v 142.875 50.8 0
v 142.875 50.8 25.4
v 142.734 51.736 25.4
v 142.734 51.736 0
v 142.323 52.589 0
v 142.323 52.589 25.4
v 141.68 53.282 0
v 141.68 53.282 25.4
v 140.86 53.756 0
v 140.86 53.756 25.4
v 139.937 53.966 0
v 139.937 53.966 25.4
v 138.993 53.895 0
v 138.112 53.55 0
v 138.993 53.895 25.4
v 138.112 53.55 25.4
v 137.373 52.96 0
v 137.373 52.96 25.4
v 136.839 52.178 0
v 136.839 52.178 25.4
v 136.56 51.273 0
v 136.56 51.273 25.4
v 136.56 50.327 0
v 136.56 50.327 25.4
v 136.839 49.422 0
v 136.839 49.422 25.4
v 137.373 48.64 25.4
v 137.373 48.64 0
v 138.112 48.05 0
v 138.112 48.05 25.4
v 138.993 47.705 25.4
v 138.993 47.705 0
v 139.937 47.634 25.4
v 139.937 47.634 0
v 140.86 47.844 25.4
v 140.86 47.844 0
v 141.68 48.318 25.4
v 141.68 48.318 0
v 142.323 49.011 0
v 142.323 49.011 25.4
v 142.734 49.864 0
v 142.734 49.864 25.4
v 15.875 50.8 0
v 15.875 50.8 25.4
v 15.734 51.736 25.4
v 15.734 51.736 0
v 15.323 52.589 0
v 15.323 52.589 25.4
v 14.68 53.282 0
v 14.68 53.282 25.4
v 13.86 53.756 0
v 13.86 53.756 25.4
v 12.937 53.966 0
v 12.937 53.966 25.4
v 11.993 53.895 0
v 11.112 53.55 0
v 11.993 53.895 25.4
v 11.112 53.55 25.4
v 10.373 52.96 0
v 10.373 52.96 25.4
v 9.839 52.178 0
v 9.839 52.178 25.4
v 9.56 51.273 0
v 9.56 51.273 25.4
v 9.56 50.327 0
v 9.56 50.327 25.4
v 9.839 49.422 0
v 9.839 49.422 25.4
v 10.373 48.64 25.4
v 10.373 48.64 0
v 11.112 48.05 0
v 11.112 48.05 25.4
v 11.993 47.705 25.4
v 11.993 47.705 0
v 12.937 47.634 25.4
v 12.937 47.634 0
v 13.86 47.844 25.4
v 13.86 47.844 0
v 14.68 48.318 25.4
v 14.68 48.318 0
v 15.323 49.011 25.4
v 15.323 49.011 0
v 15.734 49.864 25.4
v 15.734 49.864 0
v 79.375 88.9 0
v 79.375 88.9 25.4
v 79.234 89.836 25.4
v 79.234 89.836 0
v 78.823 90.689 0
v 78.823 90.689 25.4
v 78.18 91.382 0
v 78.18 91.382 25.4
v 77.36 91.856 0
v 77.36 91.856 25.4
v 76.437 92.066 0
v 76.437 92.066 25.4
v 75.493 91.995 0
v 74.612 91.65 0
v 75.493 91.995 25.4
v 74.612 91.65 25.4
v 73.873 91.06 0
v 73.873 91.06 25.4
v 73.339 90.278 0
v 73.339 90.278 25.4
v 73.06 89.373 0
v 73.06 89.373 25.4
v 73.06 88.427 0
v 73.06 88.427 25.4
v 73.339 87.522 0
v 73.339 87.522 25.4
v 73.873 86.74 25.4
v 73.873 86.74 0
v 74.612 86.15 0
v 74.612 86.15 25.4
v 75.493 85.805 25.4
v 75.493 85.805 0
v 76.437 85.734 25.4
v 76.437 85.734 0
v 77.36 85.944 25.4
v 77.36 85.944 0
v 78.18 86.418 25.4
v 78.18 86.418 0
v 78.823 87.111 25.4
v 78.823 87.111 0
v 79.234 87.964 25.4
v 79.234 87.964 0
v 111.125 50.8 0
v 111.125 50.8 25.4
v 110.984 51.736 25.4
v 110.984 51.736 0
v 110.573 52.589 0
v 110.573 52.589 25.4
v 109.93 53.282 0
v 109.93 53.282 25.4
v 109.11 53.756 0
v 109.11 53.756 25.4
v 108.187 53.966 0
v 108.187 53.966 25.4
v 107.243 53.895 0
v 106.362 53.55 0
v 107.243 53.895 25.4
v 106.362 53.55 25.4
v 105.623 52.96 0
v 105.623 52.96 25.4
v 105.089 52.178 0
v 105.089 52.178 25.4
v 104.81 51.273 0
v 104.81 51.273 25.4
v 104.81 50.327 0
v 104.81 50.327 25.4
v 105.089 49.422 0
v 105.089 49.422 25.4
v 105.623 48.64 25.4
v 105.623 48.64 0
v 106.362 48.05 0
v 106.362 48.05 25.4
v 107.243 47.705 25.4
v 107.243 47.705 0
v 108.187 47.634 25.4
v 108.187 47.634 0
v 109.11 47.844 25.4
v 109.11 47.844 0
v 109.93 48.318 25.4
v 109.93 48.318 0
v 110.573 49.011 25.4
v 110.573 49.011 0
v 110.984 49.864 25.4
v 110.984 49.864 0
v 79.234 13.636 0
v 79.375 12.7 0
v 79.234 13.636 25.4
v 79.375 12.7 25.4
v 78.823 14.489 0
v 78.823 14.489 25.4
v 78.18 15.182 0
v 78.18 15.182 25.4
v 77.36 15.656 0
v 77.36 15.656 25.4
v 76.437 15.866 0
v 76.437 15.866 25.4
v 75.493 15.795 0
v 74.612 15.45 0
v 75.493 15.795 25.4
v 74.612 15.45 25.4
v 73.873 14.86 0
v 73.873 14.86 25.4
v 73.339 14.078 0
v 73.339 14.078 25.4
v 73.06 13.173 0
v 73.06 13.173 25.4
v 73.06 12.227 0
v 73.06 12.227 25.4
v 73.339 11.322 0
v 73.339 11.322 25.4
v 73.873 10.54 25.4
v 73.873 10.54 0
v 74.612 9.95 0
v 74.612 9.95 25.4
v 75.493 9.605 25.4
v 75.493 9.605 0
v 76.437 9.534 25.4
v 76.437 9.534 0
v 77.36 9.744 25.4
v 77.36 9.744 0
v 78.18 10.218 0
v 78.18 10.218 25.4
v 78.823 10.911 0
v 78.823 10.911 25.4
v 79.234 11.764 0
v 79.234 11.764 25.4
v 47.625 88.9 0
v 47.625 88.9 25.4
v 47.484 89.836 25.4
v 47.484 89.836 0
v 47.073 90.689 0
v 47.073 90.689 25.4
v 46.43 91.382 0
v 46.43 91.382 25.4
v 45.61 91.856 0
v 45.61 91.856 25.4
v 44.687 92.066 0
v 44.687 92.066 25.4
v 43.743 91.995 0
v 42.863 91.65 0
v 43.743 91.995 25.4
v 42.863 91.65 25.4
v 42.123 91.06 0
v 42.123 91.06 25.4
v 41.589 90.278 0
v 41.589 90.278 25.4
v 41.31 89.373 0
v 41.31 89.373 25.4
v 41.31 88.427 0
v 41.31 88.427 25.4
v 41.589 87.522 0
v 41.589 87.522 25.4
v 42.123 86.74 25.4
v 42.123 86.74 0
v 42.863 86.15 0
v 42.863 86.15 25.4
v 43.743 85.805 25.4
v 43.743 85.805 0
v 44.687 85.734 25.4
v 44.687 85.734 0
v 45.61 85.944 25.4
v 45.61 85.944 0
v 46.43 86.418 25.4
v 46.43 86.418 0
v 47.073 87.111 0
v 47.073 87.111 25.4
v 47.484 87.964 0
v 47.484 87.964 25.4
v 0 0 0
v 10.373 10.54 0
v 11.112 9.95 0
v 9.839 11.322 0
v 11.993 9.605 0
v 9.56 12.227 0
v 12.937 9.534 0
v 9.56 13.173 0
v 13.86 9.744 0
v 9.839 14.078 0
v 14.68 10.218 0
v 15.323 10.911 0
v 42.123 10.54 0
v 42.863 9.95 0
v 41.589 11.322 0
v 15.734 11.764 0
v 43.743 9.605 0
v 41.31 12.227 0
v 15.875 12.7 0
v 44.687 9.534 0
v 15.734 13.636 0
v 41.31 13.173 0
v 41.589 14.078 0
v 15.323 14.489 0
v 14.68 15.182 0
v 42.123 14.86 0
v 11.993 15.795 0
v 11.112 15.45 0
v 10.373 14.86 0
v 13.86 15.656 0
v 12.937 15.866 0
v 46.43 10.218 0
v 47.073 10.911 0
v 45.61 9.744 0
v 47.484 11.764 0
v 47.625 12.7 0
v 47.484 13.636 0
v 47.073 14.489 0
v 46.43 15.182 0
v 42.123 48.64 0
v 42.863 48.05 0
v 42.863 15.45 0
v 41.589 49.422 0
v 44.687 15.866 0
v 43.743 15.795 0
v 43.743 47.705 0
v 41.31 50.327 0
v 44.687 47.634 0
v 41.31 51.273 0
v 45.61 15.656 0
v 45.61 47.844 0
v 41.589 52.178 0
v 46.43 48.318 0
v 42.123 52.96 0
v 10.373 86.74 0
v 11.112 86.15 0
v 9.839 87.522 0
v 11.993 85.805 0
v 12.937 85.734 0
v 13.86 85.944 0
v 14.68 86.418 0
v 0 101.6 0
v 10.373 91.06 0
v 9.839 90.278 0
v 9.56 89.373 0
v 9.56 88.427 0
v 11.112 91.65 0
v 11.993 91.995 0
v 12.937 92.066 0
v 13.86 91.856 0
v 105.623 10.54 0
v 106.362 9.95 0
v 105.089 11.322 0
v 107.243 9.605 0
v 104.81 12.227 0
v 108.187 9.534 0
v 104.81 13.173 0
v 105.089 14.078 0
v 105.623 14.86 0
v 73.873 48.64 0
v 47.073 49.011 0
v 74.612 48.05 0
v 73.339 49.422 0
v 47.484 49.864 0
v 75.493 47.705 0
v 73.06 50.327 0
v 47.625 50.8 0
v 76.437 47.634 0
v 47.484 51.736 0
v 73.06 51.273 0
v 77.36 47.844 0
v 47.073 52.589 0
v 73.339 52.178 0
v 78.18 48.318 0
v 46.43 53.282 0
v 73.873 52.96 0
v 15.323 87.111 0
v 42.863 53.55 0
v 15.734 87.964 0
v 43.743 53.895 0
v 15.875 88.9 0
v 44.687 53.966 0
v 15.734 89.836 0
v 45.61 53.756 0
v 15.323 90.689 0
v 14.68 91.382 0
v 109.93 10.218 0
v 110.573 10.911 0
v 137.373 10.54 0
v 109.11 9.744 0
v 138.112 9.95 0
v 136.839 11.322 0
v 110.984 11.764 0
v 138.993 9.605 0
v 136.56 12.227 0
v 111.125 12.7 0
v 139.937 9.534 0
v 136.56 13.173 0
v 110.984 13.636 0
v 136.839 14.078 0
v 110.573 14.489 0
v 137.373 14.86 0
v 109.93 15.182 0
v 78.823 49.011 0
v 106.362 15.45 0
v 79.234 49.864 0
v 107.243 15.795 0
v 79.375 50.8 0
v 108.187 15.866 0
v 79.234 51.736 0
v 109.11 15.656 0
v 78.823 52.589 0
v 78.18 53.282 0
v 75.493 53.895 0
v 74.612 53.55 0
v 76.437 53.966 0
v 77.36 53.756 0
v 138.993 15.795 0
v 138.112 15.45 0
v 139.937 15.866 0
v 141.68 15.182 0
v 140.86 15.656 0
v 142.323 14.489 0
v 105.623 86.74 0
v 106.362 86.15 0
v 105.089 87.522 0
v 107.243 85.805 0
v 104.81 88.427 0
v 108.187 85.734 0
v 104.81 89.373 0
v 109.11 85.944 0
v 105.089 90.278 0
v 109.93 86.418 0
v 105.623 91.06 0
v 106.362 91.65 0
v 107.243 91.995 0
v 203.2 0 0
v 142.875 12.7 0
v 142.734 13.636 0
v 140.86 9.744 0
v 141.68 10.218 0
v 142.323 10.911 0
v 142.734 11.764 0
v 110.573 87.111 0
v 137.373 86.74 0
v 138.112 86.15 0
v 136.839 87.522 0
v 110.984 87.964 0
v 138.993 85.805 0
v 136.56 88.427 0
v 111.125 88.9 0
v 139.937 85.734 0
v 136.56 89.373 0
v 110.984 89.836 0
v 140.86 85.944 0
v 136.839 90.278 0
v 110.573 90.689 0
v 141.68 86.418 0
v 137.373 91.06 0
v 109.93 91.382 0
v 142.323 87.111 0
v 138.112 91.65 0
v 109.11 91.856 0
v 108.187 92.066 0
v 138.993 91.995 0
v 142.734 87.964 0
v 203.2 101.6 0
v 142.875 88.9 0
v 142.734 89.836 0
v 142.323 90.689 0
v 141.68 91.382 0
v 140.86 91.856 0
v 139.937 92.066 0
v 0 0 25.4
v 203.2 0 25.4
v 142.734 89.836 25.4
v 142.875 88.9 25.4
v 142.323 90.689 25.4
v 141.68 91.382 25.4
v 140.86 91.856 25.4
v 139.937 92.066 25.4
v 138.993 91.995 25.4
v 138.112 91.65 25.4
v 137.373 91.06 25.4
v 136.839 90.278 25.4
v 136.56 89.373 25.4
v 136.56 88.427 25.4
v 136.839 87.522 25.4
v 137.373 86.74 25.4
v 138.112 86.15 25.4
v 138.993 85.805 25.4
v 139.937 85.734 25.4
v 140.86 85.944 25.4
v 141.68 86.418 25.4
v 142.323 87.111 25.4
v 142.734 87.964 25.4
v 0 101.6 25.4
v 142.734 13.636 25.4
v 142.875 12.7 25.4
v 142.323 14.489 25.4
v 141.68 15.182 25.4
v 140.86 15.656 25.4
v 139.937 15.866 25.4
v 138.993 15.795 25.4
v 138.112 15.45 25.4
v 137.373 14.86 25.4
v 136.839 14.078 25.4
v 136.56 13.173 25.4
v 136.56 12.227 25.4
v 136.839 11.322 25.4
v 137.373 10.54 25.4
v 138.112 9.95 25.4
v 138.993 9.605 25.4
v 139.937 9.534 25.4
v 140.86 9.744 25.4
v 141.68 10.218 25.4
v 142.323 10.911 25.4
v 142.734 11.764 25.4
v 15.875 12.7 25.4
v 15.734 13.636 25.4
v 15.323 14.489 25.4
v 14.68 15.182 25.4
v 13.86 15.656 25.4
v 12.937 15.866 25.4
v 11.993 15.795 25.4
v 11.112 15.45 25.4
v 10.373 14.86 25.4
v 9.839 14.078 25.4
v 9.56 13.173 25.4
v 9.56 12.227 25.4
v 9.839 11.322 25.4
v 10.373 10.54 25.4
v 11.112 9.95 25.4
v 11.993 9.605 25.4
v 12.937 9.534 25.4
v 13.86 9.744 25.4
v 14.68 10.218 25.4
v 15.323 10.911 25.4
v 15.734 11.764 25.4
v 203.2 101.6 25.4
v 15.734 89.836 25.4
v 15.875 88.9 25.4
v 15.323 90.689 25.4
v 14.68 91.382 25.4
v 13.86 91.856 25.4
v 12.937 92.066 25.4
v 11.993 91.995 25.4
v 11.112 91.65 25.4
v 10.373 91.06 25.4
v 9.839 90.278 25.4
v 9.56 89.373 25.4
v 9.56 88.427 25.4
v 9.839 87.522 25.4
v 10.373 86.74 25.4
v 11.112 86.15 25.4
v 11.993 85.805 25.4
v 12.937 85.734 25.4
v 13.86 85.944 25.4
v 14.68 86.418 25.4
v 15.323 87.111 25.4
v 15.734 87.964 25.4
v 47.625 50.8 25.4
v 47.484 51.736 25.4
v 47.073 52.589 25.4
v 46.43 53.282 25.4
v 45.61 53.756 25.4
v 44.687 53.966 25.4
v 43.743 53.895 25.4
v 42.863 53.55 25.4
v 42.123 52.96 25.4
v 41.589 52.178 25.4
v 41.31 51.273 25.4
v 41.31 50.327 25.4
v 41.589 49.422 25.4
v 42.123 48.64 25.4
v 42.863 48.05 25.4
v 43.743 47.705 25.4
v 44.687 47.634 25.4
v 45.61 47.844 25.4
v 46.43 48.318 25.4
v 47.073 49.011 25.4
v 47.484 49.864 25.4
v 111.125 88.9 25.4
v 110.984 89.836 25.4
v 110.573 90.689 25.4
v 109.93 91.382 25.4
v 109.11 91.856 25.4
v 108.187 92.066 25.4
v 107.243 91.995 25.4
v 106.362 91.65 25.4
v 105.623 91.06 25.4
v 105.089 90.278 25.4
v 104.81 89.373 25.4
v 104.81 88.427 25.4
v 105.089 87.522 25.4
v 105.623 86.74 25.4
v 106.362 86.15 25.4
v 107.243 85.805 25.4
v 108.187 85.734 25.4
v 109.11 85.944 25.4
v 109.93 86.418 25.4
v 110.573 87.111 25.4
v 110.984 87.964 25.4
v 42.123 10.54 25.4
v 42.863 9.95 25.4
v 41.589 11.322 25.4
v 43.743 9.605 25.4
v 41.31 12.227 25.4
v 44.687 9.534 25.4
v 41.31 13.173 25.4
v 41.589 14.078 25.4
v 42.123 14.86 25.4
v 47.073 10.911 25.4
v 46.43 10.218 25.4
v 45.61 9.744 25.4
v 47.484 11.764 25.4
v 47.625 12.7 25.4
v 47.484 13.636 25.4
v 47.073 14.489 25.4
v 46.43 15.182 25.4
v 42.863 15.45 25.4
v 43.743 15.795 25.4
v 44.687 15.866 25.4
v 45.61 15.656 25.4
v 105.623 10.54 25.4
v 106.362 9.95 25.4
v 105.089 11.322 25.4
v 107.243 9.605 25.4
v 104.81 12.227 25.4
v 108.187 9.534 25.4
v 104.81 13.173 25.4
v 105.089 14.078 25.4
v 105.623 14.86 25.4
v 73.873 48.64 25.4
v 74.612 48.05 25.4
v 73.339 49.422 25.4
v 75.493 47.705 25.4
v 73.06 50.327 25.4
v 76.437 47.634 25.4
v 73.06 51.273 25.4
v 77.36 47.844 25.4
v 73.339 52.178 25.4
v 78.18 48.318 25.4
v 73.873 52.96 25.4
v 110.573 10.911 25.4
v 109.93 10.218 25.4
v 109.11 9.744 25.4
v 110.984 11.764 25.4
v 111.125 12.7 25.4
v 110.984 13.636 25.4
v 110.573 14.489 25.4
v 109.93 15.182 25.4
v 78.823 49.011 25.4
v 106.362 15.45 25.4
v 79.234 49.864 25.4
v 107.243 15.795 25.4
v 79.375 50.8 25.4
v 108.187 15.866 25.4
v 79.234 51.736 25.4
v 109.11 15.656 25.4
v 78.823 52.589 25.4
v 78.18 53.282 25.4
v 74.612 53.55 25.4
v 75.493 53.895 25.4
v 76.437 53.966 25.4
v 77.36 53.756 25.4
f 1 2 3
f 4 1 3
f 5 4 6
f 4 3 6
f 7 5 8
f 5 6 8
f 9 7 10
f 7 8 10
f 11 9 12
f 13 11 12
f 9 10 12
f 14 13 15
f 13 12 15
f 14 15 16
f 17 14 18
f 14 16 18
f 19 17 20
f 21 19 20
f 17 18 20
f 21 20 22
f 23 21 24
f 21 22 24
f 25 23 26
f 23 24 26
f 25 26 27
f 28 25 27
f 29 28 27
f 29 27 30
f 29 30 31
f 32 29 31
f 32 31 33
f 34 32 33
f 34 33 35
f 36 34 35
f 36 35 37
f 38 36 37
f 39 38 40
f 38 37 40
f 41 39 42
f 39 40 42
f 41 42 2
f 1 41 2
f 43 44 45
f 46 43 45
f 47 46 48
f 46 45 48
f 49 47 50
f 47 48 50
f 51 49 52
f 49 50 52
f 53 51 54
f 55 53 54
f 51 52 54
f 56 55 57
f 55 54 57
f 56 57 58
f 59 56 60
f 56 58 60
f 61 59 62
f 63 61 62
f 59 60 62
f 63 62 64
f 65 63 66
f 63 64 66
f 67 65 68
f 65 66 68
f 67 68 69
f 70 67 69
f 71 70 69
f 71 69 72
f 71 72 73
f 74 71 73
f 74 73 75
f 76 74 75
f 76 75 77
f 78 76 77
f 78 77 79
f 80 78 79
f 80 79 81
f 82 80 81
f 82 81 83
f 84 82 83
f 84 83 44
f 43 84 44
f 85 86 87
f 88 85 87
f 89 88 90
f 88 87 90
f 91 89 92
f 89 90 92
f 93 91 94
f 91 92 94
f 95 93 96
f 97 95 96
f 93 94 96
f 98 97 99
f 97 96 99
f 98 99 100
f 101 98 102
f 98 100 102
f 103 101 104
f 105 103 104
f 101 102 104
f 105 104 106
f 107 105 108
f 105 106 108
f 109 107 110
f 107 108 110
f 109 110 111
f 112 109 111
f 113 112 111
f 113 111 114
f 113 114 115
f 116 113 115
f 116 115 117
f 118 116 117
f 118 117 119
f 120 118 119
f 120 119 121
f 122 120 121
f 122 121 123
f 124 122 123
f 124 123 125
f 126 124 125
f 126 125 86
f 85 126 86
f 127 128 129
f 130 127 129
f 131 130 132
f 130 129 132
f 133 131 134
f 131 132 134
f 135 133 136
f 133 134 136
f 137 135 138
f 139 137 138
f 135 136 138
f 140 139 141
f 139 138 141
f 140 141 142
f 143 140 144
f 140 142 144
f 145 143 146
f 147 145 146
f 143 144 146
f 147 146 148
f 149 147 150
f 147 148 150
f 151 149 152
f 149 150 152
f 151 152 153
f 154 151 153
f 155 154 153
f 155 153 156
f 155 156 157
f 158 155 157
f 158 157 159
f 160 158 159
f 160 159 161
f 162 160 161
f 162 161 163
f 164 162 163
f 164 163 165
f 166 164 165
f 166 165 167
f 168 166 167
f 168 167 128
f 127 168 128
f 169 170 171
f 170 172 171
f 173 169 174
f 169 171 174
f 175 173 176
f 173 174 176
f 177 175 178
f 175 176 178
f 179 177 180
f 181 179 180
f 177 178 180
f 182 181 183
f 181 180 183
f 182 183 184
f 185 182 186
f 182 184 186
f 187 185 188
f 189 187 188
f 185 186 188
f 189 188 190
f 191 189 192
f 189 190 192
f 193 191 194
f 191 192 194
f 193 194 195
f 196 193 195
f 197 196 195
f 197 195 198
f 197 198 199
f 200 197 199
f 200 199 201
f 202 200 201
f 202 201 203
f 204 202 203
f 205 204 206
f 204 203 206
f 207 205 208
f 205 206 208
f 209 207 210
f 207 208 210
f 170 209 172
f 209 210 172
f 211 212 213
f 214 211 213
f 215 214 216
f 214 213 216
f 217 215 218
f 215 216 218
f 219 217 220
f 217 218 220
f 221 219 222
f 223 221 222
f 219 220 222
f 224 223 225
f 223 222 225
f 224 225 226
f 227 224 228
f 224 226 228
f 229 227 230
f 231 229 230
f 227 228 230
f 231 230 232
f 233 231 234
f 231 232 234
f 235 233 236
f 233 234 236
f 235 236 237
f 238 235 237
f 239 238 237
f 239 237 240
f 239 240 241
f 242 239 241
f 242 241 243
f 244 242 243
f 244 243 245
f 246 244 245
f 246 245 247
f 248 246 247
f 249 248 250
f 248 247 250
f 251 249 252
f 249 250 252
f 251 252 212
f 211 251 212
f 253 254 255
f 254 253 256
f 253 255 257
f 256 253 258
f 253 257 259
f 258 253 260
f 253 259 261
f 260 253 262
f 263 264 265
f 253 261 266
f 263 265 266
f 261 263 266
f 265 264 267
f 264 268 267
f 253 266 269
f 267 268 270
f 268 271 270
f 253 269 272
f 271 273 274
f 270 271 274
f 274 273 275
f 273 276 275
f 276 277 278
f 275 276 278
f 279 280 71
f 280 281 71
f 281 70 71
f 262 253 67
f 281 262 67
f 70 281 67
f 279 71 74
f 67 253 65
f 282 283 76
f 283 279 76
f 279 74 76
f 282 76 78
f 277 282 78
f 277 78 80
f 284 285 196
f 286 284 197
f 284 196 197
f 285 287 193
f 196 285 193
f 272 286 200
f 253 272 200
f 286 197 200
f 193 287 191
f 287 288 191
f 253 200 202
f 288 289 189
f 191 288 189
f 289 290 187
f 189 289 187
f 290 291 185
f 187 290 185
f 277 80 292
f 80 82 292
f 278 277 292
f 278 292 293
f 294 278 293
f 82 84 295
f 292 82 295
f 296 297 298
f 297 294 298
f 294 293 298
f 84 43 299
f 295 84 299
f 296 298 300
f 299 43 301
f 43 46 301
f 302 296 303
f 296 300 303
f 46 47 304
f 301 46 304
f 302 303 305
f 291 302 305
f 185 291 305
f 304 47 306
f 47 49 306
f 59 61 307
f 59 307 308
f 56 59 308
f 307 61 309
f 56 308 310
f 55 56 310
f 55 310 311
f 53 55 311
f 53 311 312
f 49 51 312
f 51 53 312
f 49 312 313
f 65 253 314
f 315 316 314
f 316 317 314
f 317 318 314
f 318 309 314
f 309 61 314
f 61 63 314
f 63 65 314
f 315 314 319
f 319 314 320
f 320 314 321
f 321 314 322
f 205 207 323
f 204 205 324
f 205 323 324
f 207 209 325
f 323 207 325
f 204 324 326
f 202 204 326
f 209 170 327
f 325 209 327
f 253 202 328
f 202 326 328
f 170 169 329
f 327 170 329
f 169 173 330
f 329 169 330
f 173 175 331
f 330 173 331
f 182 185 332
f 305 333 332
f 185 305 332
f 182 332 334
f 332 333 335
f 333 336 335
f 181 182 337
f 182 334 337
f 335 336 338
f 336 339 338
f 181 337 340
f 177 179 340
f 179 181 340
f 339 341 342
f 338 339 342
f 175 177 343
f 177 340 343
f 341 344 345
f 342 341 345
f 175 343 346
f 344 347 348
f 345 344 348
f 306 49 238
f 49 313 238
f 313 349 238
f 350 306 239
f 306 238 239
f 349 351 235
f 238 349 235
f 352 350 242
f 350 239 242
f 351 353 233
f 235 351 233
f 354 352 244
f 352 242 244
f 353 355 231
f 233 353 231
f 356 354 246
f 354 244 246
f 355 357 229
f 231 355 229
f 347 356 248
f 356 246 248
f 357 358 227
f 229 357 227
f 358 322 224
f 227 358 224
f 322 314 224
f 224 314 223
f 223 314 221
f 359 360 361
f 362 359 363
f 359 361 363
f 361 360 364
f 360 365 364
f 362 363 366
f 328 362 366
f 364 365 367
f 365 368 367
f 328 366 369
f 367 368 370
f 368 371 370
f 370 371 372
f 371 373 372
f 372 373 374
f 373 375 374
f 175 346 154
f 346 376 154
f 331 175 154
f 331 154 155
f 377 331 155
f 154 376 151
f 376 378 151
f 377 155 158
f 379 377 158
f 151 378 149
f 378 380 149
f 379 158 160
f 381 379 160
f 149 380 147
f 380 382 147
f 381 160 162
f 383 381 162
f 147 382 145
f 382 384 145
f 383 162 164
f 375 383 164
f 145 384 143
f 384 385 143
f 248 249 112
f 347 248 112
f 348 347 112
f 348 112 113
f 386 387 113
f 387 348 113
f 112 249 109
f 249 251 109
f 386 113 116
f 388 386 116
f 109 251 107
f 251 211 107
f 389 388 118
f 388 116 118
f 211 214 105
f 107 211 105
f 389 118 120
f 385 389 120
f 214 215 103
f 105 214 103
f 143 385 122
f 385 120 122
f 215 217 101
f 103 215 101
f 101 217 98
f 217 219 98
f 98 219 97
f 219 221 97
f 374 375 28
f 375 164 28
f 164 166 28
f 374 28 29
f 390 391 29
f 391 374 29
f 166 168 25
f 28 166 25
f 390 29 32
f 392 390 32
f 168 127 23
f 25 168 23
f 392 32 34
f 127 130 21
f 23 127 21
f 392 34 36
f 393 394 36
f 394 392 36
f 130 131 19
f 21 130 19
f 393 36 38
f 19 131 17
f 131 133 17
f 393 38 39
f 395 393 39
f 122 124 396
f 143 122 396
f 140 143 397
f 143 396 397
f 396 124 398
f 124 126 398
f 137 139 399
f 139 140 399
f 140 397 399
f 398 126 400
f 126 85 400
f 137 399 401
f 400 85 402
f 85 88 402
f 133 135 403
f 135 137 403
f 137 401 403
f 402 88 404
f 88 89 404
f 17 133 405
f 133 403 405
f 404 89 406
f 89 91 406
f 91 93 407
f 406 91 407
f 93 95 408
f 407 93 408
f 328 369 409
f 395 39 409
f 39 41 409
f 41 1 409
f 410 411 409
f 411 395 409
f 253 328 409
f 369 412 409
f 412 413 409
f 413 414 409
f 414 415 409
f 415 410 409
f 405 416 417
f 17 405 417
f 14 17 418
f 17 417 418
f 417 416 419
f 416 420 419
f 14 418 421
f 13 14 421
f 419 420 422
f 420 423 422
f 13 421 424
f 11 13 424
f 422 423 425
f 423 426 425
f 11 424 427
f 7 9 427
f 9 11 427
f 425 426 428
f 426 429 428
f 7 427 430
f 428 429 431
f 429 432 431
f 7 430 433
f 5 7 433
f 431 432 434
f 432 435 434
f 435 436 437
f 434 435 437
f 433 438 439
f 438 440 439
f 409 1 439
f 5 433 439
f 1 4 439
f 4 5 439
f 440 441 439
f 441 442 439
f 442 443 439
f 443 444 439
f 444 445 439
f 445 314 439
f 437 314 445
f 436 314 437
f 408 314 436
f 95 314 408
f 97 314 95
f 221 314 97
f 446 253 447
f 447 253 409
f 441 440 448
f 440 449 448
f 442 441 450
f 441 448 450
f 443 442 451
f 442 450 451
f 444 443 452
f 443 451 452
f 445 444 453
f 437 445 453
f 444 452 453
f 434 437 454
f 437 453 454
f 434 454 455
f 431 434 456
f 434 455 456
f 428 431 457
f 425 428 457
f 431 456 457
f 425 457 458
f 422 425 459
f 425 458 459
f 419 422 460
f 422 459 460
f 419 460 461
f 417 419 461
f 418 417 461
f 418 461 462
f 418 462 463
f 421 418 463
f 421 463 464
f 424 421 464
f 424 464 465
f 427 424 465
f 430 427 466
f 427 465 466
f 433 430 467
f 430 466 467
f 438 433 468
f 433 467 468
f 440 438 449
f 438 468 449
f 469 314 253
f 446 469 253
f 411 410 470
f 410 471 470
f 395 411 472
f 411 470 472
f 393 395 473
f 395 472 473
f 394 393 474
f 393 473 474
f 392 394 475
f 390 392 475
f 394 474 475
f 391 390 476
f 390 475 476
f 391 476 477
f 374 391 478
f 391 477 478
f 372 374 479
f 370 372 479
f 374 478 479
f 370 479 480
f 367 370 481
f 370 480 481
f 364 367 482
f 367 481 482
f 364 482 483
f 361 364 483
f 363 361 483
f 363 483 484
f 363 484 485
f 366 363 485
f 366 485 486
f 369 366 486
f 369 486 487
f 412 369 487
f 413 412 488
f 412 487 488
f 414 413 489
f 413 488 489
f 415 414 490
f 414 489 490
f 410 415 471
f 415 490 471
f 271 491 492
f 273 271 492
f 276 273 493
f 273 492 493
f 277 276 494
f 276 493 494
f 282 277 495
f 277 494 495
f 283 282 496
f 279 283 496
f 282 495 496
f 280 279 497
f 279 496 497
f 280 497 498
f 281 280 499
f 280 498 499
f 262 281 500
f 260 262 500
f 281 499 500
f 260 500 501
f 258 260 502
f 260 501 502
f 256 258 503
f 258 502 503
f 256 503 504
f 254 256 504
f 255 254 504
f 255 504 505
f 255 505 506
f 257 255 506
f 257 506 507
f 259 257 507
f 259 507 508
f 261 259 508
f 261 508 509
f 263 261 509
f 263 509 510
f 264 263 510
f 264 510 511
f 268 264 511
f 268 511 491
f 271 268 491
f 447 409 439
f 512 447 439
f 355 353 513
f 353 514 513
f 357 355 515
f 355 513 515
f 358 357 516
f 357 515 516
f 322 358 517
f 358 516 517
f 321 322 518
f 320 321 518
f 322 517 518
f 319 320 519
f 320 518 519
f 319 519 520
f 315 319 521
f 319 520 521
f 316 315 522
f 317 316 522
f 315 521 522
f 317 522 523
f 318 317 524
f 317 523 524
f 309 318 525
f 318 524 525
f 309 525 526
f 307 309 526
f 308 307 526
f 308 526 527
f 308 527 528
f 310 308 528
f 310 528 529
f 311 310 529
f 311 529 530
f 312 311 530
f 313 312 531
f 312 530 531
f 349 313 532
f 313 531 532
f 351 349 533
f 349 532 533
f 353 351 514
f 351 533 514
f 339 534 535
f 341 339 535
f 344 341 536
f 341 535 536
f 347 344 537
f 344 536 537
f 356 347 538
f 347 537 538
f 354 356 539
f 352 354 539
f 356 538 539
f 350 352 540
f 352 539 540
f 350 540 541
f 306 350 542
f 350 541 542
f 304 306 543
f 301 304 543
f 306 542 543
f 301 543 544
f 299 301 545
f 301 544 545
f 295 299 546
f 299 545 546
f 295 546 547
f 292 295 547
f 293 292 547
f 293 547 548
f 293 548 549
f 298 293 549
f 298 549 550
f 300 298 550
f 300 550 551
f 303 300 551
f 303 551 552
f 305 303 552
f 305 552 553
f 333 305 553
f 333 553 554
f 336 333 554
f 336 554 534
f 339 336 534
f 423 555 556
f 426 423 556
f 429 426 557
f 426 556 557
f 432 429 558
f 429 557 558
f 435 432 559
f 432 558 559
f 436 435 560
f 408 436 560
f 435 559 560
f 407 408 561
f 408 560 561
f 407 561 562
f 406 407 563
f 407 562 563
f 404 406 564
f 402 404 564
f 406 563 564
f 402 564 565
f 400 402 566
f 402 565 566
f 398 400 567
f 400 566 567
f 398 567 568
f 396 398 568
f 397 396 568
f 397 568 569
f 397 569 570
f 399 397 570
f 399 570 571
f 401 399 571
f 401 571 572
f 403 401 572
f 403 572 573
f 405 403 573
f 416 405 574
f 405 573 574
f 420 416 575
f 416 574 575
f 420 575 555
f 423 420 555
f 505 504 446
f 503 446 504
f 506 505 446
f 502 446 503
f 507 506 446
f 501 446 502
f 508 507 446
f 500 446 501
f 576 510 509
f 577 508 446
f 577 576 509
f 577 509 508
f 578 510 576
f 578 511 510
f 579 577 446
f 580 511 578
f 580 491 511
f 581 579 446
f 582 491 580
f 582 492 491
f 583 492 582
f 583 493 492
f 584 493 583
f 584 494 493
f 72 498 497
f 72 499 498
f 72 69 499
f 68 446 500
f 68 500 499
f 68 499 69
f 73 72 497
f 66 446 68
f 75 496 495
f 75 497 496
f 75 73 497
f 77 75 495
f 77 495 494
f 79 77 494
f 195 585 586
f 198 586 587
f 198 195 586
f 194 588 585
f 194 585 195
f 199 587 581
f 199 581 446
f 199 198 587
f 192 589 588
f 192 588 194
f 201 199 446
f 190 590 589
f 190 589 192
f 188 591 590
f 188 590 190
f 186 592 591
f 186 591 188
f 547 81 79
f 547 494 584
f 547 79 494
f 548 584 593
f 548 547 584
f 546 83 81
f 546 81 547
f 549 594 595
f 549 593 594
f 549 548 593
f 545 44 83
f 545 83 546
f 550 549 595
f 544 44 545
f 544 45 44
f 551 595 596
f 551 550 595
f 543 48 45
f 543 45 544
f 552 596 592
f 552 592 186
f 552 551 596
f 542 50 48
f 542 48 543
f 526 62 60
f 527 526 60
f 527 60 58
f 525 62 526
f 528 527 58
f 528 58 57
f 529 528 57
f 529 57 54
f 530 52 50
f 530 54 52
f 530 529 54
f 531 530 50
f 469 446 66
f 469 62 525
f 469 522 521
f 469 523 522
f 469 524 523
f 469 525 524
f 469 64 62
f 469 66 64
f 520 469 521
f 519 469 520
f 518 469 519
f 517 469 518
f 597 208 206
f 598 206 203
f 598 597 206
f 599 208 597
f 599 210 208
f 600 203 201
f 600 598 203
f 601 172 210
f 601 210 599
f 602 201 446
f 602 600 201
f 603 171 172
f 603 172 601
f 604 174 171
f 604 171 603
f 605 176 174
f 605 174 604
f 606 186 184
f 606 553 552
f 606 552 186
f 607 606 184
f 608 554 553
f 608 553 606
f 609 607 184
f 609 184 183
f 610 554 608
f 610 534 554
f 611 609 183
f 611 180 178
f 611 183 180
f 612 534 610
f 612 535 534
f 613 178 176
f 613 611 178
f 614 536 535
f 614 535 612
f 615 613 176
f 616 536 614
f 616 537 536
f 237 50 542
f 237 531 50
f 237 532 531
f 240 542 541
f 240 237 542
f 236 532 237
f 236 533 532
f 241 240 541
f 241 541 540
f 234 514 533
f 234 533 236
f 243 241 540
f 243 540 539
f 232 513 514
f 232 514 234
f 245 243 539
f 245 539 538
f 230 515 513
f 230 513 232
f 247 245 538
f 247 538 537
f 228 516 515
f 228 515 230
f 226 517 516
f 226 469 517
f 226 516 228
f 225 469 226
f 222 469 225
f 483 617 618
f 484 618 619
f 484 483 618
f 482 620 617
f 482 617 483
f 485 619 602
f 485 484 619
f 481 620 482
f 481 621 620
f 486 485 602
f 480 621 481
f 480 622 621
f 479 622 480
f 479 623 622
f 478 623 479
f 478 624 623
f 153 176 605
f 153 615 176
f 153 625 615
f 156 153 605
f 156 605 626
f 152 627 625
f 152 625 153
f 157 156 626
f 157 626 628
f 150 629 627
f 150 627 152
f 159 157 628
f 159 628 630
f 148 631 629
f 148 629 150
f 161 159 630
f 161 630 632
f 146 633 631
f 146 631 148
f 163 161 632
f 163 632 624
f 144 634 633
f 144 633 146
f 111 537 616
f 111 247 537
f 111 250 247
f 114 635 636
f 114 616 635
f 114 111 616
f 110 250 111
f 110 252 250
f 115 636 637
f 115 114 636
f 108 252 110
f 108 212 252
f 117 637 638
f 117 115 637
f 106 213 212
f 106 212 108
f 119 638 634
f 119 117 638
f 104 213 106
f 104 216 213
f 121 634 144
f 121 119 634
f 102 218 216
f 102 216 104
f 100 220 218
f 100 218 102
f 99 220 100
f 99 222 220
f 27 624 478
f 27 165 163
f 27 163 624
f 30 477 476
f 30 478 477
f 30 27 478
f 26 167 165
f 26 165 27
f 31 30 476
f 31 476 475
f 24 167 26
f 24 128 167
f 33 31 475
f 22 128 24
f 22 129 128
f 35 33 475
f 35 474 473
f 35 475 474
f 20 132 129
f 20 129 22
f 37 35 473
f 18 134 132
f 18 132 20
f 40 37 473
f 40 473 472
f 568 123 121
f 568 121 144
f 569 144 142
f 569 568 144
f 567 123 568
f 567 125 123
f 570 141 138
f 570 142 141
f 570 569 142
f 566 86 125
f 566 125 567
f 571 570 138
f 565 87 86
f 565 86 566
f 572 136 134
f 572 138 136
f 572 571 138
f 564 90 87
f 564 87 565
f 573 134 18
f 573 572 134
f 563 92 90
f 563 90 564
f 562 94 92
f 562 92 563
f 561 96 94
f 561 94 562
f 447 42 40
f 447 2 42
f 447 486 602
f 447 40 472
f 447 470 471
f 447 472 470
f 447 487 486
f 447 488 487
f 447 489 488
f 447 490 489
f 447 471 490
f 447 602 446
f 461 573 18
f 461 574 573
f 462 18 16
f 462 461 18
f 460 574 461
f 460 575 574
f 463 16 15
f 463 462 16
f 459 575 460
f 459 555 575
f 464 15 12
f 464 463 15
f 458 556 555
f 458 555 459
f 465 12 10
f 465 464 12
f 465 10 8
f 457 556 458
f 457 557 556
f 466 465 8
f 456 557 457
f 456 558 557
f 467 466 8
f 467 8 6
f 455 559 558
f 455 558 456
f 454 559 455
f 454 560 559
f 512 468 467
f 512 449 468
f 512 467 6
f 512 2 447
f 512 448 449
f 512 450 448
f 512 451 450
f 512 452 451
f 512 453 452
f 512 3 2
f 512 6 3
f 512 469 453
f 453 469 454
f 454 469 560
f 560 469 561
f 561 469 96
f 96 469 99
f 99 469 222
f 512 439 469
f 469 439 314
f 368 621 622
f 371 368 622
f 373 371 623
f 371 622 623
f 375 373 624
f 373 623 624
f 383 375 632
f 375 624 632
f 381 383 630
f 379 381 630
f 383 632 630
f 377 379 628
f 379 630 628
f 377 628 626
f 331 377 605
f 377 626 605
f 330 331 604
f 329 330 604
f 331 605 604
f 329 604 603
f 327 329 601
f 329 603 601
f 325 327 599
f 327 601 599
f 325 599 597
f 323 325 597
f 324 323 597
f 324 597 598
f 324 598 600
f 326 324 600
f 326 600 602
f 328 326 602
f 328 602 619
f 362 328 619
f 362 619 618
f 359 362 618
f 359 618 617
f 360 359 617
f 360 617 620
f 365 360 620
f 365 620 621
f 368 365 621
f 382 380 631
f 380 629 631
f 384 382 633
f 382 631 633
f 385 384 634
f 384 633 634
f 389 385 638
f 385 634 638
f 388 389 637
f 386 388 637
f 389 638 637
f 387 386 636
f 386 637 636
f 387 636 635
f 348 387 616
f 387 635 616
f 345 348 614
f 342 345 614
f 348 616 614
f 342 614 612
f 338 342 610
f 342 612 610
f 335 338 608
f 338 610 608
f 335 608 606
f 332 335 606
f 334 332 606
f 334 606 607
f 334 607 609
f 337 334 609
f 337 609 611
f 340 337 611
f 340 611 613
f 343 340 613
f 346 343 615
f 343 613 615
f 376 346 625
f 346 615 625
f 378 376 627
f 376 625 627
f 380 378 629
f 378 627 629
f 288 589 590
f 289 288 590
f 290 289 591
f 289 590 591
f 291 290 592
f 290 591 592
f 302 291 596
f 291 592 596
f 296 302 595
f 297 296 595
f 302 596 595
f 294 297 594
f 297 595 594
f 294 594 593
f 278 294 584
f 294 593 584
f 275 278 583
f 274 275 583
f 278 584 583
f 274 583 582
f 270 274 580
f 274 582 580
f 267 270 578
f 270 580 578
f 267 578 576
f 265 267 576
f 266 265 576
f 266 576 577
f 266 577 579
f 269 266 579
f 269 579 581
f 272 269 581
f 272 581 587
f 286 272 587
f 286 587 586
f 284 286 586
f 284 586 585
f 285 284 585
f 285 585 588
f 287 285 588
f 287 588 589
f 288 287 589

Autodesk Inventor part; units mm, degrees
ref_plane "YZ Plane" through (0, 0, 0) normal (1, 0, 0) x (0, 1, 0)
ref_plane "XZ Plane" through (0, 0, 0) normal (0, 1, 0) x (-1, 0, 0)
ref_plane "XY Plane" through (0, 0, 0) normal (0, 0, 1) x (1, 0, 0)
sketch "Sketch1" plane through (0, 0, 0) normal (0, 0, 1) x (1, 0, 0)
  line L0 (0, 0) -> (203.2, 0)
  line L1 (203.2, 0) -> (203.2, 101.6)
  line L2 (203.2, 101.6) -> (0, 101.6)
  line L3 (0, 101.6) -> (0, 0)
  dimension "d0" = 203.2
  dimension "d1" = 101.6
extrude "Extrusion1" add sketch "Sketch1" along normal blind 25.4
sketch "Sketch2" plane through (0, 0, 25.4) normal (0, 0, 1) x (1, 0, 0)
  line L0 (203.2, 101.6) -> (0, 101.6) projected
  line L1 (0, 101.6) -> (0, 0) projected
  circle A0 centre (12.7, 88.9) radius 3.175
  dimension "d4" = 6.35
  dimension "d5" = 12.7
  dimension "d6" = 12.7
extrude "Extrusion2" cut sketch "Sketch2" against normal through all
pattern_linear "Rectangular Pattern1" count 5 spacing 31.75 along (1, 0, 0) count 3 spacing 38.1 along (0, -1, 0) of "Extrusion2"
properties part number "Rectangular Pattern Parameters"
